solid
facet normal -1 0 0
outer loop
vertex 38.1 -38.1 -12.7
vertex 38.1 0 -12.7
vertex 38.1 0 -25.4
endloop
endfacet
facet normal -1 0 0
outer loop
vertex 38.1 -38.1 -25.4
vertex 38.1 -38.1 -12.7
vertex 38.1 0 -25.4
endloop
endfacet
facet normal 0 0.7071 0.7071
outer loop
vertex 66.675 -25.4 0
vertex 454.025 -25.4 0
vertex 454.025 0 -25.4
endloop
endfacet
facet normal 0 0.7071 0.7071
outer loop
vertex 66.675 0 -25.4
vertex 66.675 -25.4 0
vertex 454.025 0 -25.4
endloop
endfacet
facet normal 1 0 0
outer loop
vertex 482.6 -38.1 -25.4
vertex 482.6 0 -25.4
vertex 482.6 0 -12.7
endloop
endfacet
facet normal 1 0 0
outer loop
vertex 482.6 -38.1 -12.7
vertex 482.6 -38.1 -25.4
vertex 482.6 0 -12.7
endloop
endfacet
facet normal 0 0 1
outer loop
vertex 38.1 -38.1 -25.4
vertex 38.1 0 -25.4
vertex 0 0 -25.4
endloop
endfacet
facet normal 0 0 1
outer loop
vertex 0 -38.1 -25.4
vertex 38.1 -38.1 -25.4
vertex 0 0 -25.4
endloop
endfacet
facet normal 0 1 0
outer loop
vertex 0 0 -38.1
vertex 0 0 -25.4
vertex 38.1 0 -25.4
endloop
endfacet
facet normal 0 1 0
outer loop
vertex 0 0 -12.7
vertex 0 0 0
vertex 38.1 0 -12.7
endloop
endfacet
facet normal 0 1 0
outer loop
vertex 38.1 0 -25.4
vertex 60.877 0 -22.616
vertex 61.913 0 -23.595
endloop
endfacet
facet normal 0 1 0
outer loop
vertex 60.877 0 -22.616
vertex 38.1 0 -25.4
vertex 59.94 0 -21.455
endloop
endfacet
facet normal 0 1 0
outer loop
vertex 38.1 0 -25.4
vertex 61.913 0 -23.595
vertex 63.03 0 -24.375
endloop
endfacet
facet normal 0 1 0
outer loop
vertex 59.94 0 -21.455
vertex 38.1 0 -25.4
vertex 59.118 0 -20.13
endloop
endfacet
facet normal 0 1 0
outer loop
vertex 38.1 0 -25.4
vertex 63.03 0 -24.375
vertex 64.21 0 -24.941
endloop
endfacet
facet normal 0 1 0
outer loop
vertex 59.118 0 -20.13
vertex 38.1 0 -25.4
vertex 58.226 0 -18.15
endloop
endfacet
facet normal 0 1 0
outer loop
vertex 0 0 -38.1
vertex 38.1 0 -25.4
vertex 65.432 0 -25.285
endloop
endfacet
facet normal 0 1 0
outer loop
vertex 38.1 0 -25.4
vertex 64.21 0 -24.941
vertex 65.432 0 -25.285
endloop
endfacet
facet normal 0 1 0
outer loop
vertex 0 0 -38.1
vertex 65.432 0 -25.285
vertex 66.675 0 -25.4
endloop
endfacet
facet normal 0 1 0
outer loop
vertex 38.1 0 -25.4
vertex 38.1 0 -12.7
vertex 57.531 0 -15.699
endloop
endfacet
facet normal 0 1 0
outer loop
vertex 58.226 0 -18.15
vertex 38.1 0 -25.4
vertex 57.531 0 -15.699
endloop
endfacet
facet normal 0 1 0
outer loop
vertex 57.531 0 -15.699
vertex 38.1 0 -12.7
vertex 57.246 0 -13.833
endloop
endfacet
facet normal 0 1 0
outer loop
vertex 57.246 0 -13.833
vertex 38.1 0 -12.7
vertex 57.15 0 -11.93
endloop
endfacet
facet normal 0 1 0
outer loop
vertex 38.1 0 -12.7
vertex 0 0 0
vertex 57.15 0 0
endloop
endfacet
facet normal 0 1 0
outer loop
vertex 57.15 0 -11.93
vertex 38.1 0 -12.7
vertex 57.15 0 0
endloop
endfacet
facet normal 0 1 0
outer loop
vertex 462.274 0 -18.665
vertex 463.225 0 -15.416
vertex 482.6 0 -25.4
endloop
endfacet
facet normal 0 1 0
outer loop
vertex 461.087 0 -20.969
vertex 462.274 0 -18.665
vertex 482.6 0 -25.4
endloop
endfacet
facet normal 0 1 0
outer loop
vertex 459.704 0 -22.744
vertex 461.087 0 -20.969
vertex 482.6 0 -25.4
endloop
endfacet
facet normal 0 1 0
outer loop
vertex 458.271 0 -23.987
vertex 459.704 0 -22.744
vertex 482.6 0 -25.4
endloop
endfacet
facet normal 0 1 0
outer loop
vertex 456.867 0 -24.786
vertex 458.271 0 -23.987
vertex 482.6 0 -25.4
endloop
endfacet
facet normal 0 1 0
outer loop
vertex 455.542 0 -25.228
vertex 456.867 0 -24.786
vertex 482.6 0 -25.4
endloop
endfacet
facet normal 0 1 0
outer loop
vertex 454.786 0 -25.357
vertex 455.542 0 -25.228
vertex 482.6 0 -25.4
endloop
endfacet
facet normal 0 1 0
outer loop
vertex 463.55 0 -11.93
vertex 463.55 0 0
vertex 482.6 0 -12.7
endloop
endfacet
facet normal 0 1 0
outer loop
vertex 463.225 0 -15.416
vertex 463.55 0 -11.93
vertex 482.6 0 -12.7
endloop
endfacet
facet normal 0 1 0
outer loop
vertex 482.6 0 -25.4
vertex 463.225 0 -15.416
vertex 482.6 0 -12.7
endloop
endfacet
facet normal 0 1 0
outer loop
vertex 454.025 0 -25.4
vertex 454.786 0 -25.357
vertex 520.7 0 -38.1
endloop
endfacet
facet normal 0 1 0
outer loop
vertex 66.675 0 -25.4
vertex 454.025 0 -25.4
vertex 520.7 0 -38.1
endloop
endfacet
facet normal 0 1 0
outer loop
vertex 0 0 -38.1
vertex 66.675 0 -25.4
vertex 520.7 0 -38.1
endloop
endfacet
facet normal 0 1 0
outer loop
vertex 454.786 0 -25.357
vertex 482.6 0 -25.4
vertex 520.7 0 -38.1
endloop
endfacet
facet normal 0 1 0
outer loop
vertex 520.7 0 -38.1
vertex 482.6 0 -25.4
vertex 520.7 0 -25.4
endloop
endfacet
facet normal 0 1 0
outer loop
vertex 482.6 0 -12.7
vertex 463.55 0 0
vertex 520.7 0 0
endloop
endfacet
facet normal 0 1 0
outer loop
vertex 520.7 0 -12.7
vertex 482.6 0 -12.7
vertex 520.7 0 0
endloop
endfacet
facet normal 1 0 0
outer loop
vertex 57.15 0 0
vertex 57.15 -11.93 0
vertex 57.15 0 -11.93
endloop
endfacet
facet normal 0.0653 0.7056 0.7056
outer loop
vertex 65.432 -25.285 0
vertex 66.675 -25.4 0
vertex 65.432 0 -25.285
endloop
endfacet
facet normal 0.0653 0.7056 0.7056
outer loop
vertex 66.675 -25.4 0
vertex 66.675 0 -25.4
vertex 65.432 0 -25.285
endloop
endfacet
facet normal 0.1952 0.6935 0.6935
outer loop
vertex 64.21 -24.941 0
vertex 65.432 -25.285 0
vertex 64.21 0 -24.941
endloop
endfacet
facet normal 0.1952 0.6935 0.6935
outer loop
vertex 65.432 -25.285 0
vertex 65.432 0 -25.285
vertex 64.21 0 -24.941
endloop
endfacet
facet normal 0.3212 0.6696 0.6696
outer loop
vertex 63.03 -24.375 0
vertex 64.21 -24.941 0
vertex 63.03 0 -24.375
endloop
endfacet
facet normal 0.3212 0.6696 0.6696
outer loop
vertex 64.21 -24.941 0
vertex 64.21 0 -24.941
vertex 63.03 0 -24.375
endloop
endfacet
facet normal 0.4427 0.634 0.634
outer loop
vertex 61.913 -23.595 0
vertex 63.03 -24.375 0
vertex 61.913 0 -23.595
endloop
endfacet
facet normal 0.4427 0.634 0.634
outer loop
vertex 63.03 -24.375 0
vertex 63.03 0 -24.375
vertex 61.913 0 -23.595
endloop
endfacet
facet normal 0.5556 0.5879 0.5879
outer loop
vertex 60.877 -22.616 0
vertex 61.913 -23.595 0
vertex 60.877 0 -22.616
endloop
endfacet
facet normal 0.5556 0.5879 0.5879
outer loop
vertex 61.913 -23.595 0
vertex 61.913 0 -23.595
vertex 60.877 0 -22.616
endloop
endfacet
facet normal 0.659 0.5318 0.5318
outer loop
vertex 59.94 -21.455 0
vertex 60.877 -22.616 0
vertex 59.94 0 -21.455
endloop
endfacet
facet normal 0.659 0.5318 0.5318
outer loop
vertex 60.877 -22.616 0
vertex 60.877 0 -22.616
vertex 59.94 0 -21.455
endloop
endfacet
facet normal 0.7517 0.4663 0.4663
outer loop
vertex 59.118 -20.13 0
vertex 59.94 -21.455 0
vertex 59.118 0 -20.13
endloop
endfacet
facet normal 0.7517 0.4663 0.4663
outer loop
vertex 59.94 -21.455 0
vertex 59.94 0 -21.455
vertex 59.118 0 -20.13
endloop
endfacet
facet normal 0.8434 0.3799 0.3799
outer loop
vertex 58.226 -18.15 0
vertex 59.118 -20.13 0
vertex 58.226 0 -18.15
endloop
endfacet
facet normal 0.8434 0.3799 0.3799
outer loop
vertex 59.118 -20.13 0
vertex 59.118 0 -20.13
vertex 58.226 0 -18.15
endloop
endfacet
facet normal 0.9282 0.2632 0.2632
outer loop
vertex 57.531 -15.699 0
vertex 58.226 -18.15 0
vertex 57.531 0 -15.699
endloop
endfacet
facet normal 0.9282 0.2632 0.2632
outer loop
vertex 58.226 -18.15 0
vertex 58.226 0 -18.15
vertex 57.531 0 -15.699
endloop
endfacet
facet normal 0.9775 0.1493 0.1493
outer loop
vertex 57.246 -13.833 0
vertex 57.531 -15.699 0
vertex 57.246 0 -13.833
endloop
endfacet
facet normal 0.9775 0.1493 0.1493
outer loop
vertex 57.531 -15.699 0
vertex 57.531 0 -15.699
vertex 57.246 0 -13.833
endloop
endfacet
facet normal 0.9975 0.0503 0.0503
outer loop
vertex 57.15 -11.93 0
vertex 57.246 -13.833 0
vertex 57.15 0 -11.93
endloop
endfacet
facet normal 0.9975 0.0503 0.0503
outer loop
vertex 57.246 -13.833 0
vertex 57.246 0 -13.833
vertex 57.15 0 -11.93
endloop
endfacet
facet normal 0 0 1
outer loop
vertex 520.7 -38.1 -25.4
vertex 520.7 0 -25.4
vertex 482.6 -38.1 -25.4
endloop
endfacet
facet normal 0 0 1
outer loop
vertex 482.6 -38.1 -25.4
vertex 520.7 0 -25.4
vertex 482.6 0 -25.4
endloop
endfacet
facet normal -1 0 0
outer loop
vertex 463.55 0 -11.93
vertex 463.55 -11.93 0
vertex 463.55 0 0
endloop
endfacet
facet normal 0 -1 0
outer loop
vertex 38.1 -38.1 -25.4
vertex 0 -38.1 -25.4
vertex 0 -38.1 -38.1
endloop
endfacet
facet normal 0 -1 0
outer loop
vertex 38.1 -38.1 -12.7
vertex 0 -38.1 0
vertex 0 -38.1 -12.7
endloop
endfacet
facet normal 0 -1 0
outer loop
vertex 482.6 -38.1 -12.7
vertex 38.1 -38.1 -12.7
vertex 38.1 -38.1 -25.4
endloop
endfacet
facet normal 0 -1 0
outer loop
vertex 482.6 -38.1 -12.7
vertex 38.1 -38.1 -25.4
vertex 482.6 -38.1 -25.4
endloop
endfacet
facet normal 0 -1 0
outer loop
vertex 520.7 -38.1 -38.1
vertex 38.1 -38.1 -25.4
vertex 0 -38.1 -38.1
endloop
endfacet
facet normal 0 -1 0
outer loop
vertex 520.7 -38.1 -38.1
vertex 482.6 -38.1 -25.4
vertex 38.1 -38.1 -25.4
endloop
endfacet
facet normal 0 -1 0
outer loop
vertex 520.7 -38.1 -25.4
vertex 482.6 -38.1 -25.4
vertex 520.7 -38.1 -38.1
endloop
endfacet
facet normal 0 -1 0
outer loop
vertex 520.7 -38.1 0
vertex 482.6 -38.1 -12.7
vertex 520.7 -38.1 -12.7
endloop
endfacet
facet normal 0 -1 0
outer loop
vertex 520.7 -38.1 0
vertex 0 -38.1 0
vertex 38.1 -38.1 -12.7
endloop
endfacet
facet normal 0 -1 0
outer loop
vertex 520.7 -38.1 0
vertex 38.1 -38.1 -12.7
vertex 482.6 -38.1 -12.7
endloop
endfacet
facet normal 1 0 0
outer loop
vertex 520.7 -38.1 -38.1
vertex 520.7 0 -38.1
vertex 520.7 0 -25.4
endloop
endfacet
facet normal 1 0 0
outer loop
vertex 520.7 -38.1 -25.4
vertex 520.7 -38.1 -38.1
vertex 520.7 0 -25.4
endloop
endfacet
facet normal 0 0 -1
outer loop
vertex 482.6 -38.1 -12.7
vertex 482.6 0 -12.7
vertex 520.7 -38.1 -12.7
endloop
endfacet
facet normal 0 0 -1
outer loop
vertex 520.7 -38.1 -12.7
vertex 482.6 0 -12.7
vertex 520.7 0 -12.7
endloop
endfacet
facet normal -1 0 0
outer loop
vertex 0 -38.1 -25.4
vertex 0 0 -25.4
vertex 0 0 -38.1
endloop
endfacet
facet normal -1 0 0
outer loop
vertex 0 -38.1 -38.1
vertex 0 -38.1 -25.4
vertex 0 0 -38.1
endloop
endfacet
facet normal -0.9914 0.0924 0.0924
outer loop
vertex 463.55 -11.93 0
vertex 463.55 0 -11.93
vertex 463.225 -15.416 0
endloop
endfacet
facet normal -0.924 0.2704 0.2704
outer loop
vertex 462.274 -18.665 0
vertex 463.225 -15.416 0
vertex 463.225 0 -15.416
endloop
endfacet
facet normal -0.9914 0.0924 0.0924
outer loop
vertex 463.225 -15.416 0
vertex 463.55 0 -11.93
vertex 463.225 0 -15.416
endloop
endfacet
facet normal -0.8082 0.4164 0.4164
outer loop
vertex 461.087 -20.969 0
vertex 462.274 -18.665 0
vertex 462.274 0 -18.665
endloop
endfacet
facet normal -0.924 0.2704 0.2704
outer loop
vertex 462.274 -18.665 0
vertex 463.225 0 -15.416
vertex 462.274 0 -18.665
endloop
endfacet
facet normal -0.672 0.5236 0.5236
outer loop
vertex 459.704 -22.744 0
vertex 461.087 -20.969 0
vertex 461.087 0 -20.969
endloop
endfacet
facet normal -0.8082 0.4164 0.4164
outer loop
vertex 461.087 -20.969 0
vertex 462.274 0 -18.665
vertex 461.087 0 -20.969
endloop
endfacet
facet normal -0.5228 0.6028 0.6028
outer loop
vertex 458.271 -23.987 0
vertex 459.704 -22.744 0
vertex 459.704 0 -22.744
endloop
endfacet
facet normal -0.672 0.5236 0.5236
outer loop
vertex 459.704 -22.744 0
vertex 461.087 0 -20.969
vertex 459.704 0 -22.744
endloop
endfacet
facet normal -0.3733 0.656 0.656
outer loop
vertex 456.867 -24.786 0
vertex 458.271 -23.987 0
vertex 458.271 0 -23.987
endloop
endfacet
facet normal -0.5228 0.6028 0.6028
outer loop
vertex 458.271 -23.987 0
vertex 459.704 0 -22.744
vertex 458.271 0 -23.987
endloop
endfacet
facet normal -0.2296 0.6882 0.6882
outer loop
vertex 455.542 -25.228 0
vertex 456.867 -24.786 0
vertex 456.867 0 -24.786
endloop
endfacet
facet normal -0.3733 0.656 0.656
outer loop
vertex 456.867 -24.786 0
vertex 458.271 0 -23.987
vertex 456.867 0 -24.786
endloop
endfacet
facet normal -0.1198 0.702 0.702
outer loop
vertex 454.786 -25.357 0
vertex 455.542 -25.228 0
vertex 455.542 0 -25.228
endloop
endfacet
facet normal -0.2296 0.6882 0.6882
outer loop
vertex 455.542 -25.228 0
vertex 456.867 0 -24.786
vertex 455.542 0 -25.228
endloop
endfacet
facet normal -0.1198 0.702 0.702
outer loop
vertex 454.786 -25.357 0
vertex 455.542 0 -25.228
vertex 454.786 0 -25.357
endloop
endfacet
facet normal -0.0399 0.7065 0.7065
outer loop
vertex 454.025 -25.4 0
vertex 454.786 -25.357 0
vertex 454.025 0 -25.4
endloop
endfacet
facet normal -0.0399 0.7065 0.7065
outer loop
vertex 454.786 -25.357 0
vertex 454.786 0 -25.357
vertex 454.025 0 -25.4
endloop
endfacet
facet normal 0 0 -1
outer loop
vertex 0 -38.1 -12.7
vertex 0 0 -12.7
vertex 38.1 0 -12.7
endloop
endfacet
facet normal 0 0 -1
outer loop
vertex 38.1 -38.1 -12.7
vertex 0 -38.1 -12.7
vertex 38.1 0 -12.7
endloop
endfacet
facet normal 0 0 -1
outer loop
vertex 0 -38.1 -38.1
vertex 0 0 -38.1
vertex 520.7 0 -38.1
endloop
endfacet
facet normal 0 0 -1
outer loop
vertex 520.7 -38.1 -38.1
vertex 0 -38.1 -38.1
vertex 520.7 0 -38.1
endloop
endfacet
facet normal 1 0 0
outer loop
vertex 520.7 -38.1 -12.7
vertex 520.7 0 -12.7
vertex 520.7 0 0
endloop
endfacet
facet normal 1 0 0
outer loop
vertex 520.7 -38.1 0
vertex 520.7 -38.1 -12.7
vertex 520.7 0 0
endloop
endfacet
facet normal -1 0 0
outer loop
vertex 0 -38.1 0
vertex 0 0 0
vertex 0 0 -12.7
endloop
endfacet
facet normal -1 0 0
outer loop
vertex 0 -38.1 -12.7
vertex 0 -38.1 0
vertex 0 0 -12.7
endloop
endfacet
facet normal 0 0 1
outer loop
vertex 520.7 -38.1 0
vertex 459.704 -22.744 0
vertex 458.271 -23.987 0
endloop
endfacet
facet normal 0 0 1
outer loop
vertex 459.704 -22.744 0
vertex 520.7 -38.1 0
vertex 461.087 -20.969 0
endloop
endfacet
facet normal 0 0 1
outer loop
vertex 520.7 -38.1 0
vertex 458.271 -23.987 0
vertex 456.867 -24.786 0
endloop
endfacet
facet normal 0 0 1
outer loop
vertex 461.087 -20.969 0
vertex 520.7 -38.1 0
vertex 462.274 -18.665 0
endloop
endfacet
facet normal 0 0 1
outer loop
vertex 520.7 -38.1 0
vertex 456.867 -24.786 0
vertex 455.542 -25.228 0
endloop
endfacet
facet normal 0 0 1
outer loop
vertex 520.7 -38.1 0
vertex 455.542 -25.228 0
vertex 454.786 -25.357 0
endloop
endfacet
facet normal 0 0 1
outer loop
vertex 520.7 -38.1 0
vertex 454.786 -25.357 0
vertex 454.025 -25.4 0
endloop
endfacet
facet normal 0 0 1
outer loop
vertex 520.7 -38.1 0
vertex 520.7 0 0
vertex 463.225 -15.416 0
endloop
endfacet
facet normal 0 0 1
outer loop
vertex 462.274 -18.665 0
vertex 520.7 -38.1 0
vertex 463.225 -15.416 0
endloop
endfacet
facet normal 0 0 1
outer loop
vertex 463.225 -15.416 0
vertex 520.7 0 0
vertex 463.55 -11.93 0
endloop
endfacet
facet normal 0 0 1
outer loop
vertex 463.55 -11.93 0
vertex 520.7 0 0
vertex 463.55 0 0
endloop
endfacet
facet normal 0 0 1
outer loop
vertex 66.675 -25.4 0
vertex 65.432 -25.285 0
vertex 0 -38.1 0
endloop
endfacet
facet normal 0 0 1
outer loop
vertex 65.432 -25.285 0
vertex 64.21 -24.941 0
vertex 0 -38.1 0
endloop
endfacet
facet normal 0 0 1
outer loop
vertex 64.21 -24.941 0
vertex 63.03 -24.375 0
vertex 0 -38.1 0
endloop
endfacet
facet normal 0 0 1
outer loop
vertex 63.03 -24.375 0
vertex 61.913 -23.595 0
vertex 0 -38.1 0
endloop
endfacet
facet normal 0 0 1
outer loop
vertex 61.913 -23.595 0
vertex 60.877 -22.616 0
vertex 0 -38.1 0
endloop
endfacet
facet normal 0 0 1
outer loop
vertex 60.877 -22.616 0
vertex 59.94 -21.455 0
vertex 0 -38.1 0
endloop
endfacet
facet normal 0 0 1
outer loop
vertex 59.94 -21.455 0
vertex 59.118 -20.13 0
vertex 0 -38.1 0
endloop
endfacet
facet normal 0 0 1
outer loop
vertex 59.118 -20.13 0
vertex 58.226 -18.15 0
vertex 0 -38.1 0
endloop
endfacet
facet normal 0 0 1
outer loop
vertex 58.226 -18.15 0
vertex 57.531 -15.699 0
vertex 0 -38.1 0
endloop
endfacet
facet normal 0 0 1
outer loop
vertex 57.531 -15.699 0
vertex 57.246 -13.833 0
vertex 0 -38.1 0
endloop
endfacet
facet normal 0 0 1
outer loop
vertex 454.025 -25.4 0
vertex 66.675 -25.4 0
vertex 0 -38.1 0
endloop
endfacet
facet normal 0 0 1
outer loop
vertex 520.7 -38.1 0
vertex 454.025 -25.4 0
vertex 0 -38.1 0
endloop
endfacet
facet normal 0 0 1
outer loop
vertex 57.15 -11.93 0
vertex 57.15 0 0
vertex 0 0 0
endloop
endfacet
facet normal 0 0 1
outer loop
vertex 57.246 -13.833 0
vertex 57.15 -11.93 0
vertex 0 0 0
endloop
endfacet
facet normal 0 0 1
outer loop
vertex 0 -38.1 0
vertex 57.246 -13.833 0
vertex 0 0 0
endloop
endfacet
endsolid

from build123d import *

# Parameters (mm, degrees)
F1_DEPTH = 38.1
F4_DEPTH = 203.2
F5_R     = 9.525


with BuildPart() as f1:
    # F0 (on Front) → F1 (new body)
    with BuildSketch(Plane.XZ):
        Polygon((520.7, 0), (0, 0), (0, -12.7), (38.1, -12.7), (38.1, -25.4), (0, -25.4), (0, -38.1), (520.7, -38.1), (520.7, -25.4), (482.6, -25.4), (482.6, -12.7), (520.7, -12.7), align=None)
    extrude(amount=F1_DEPTH)

    # F3 (on offset) → F4 (cut, symmetric)
    with BuildSketch(Plane.YZ.offset(260.35)):
        Polygon((0, -25.4), (0, 0), (-25.4, 0), align=None)
    extrude(amount=F4_DEPTH, both=True, mode=Mode.SUBTRACT)

    # F5
    f5_edges = [f1.edges().sort_by_distance(p)[0] for p in [
        (463.55, -12.7, -12.7),
        (57.15, -12.7, -12.7),
    ]]
    fillet(f5_edges, radius=F5_R)


solid = f1.part
